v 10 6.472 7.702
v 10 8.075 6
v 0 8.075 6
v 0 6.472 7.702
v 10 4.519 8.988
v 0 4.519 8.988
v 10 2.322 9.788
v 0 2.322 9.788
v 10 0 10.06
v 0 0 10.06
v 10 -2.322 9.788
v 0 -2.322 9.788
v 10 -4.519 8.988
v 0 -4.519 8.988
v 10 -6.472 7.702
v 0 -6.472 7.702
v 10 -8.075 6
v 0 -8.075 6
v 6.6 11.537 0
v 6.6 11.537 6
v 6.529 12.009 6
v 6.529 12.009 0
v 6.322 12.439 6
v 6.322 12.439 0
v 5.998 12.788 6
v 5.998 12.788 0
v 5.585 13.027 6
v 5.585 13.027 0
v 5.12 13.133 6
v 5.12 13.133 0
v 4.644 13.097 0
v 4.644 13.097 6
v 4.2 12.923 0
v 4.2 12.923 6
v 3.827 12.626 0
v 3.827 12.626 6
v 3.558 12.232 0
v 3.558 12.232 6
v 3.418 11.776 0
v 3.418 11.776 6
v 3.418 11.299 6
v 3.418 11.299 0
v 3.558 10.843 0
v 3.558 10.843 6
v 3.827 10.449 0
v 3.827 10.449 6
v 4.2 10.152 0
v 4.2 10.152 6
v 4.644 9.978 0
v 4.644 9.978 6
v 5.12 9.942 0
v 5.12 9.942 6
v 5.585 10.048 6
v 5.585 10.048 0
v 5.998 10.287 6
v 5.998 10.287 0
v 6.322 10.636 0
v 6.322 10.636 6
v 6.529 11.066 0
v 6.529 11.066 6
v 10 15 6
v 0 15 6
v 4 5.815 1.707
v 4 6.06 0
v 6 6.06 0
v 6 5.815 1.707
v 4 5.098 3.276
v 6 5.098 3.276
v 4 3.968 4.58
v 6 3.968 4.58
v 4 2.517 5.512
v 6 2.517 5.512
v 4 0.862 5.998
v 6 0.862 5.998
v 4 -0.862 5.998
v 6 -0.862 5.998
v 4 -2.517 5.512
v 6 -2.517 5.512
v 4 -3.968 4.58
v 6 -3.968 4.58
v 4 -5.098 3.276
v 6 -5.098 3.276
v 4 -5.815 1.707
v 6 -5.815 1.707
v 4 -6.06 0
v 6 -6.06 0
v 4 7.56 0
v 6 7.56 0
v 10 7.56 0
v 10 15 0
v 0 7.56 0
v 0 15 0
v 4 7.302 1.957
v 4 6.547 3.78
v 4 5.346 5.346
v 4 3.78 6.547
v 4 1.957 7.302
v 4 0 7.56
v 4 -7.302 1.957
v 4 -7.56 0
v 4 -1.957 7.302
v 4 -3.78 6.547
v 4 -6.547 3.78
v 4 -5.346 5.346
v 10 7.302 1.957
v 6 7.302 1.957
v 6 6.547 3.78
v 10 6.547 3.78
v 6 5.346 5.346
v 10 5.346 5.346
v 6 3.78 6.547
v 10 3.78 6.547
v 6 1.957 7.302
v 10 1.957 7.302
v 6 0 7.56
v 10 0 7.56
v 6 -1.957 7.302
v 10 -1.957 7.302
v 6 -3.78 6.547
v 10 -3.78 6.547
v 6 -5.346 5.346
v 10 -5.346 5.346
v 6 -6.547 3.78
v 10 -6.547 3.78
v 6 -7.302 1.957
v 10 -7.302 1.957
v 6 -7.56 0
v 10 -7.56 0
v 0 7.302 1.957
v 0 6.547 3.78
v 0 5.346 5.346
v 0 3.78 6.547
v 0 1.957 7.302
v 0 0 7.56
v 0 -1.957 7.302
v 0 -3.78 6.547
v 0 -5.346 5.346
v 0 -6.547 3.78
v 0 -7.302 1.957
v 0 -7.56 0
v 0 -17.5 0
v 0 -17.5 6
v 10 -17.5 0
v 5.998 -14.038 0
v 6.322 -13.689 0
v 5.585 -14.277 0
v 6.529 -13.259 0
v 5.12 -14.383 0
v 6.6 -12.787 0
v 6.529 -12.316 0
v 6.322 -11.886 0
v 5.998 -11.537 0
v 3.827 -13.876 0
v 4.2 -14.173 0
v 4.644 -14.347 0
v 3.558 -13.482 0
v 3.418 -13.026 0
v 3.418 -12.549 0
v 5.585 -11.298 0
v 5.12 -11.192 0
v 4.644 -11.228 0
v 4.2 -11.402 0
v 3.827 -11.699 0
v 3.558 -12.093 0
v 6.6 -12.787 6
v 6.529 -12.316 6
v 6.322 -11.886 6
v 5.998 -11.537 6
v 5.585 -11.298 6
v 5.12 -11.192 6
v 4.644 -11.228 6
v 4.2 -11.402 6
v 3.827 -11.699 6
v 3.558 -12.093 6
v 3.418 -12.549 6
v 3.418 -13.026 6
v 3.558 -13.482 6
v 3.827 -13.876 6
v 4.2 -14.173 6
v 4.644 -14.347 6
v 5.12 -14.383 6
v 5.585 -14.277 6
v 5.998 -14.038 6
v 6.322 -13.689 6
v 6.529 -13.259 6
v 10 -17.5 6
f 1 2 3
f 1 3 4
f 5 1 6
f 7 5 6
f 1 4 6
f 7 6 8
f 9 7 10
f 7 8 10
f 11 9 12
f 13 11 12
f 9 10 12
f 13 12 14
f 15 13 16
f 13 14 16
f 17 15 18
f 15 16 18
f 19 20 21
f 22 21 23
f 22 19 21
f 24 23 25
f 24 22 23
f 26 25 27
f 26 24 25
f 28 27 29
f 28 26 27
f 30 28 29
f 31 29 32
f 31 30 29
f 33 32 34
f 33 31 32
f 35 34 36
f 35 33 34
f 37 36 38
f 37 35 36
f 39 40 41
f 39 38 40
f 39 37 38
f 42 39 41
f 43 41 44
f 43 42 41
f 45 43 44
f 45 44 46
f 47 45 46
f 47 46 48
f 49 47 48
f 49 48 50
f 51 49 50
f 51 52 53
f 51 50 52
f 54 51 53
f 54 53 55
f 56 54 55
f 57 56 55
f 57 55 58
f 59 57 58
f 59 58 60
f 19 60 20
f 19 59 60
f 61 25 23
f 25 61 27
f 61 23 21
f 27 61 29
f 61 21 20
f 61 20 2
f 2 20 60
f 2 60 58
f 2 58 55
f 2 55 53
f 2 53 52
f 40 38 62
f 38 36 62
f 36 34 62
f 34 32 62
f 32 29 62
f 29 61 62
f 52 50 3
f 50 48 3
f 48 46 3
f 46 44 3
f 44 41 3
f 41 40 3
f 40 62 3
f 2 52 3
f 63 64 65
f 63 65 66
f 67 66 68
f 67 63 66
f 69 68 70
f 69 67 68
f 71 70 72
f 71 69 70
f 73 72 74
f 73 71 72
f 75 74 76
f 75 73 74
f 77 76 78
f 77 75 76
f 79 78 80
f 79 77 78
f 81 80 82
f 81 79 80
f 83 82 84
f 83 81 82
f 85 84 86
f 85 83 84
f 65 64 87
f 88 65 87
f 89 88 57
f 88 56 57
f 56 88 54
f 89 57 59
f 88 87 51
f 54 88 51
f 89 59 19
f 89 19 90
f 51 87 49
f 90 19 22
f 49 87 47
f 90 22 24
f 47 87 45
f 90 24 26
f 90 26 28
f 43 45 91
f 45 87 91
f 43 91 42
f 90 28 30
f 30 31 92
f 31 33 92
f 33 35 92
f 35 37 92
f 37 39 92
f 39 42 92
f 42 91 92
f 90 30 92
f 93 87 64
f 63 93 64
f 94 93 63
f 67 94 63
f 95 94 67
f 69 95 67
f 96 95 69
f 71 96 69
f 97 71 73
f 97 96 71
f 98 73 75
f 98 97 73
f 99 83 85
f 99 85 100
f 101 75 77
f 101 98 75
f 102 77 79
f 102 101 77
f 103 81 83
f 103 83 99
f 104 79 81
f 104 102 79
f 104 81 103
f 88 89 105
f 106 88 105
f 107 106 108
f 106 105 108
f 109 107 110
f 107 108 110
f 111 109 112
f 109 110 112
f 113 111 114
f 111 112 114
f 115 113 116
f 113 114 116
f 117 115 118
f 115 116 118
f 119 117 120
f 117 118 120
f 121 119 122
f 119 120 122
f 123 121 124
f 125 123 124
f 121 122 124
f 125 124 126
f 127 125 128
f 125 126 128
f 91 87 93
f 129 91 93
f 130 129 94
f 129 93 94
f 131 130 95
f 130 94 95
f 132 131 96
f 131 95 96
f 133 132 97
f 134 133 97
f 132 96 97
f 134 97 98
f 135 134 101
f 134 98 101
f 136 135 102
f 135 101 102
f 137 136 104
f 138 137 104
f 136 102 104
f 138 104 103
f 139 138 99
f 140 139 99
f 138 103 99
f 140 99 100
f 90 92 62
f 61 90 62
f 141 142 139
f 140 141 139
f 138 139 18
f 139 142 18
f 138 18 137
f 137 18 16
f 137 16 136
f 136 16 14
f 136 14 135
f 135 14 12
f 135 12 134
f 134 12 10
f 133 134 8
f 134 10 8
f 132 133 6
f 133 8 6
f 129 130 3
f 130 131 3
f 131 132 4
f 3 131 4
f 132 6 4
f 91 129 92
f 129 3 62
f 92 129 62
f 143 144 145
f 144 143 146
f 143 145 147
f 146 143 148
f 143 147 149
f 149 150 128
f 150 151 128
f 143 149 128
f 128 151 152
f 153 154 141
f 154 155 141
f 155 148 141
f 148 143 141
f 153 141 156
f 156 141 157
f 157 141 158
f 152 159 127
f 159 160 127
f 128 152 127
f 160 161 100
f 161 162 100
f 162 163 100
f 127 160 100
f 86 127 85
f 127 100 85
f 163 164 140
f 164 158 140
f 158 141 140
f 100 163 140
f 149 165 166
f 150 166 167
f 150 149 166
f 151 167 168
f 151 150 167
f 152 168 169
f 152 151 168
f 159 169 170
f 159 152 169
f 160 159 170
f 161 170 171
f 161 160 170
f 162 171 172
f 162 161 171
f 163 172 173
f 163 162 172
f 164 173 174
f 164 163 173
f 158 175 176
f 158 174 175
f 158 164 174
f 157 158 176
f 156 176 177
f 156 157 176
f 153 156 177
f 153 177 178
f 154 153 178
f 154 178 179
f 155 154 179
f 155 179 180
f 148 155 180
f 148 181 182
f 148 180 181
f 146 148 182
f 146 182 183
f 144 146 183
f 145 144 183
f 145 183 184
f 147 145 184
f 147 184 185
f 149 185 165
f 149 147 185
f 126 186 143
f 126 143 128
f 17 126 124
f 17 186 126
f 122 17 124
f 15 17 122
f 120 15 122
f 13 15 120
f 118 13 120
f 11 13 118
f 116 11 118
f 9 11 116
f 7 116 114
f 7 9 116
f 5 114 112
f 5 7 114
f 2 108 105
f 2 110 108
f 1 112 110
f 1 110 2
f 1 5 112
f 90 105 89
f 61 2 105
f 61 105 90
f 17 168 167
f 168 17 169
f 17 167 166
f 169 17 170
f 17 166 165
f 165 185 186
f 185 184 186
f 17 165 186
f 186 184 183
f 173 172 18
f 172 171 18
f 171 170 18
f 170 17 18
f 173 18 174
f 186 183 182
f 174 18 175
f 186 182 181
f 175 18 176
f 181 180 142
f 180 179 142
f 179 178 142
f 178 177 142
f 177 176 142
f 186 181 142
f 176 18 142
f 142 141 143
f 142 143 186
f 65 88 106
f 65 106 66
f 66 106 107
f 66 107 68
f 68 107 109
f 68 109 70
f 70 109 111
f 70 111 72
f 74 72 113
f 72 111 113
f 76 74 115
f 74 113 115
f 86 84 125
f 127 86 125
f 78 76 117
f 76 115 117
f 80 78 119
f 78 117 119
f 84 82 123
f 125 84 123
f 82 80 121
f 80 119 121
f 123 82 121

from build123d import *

# Parameters (mm, degrees)
PAD005_DEPTH    = 10
SKETCH015_W     = 4
SKETCH015_H     = 1.5
SKETCH016_R     = 1.6
POCKET003_DEPTH = 10.061


with BuildPart() as part:
    # Sketch014 → Pad005 (new body)
    with BuildSketch(Plane.YZ):
        with BuildLine():
            Line((-17.5, 0), (-6.06, 0))
            ThreePointArc((6.06, 0), (0, 6.06), (-6.06, 0))
            Line((6.06, 0), (15, 0))
            Line((15, 0), (15, 6))
            Line((15, 6), (8.074875, 6))
            ThreePointArc((8.074875, 6), (0, 10.06), (-8.074875, 6))
            Line((-8.074875, 6), (-17.5, 6))
            Line((-17.5, 0), (-17.5, 6))
        make_face()
    extrude(amount=PAD005_DEPTH)

    # Sketch015 → Groove005 (revolve, cut)
    with BuildSketch(Plane.XY):
        with Locations((8, 6.81)):
            Rectangle(SKETCH015_W, SKETCH015_H)
        with Locations((2, 6.81)):
            Rectangle(SKETCH015_W, SKETCH015_H)
    revolve(axis=Axis((0, 0, 0), (1, 0, 0)), mode=Mode.SUBTRACT)

    # Sketch016 → Pocket003 (cut, through all)
    with BuildSketch(Plane.XY):
        with Locations((5, 11.537437)):
            Circle(SKETCH016_R)
        with Locations((5, -12.787437)):
            Circle(SKETCH016_R)
    extrude(amount=POCKET003_DEPTH, mode=Mode.SUBTRACT)


solid = part.part
